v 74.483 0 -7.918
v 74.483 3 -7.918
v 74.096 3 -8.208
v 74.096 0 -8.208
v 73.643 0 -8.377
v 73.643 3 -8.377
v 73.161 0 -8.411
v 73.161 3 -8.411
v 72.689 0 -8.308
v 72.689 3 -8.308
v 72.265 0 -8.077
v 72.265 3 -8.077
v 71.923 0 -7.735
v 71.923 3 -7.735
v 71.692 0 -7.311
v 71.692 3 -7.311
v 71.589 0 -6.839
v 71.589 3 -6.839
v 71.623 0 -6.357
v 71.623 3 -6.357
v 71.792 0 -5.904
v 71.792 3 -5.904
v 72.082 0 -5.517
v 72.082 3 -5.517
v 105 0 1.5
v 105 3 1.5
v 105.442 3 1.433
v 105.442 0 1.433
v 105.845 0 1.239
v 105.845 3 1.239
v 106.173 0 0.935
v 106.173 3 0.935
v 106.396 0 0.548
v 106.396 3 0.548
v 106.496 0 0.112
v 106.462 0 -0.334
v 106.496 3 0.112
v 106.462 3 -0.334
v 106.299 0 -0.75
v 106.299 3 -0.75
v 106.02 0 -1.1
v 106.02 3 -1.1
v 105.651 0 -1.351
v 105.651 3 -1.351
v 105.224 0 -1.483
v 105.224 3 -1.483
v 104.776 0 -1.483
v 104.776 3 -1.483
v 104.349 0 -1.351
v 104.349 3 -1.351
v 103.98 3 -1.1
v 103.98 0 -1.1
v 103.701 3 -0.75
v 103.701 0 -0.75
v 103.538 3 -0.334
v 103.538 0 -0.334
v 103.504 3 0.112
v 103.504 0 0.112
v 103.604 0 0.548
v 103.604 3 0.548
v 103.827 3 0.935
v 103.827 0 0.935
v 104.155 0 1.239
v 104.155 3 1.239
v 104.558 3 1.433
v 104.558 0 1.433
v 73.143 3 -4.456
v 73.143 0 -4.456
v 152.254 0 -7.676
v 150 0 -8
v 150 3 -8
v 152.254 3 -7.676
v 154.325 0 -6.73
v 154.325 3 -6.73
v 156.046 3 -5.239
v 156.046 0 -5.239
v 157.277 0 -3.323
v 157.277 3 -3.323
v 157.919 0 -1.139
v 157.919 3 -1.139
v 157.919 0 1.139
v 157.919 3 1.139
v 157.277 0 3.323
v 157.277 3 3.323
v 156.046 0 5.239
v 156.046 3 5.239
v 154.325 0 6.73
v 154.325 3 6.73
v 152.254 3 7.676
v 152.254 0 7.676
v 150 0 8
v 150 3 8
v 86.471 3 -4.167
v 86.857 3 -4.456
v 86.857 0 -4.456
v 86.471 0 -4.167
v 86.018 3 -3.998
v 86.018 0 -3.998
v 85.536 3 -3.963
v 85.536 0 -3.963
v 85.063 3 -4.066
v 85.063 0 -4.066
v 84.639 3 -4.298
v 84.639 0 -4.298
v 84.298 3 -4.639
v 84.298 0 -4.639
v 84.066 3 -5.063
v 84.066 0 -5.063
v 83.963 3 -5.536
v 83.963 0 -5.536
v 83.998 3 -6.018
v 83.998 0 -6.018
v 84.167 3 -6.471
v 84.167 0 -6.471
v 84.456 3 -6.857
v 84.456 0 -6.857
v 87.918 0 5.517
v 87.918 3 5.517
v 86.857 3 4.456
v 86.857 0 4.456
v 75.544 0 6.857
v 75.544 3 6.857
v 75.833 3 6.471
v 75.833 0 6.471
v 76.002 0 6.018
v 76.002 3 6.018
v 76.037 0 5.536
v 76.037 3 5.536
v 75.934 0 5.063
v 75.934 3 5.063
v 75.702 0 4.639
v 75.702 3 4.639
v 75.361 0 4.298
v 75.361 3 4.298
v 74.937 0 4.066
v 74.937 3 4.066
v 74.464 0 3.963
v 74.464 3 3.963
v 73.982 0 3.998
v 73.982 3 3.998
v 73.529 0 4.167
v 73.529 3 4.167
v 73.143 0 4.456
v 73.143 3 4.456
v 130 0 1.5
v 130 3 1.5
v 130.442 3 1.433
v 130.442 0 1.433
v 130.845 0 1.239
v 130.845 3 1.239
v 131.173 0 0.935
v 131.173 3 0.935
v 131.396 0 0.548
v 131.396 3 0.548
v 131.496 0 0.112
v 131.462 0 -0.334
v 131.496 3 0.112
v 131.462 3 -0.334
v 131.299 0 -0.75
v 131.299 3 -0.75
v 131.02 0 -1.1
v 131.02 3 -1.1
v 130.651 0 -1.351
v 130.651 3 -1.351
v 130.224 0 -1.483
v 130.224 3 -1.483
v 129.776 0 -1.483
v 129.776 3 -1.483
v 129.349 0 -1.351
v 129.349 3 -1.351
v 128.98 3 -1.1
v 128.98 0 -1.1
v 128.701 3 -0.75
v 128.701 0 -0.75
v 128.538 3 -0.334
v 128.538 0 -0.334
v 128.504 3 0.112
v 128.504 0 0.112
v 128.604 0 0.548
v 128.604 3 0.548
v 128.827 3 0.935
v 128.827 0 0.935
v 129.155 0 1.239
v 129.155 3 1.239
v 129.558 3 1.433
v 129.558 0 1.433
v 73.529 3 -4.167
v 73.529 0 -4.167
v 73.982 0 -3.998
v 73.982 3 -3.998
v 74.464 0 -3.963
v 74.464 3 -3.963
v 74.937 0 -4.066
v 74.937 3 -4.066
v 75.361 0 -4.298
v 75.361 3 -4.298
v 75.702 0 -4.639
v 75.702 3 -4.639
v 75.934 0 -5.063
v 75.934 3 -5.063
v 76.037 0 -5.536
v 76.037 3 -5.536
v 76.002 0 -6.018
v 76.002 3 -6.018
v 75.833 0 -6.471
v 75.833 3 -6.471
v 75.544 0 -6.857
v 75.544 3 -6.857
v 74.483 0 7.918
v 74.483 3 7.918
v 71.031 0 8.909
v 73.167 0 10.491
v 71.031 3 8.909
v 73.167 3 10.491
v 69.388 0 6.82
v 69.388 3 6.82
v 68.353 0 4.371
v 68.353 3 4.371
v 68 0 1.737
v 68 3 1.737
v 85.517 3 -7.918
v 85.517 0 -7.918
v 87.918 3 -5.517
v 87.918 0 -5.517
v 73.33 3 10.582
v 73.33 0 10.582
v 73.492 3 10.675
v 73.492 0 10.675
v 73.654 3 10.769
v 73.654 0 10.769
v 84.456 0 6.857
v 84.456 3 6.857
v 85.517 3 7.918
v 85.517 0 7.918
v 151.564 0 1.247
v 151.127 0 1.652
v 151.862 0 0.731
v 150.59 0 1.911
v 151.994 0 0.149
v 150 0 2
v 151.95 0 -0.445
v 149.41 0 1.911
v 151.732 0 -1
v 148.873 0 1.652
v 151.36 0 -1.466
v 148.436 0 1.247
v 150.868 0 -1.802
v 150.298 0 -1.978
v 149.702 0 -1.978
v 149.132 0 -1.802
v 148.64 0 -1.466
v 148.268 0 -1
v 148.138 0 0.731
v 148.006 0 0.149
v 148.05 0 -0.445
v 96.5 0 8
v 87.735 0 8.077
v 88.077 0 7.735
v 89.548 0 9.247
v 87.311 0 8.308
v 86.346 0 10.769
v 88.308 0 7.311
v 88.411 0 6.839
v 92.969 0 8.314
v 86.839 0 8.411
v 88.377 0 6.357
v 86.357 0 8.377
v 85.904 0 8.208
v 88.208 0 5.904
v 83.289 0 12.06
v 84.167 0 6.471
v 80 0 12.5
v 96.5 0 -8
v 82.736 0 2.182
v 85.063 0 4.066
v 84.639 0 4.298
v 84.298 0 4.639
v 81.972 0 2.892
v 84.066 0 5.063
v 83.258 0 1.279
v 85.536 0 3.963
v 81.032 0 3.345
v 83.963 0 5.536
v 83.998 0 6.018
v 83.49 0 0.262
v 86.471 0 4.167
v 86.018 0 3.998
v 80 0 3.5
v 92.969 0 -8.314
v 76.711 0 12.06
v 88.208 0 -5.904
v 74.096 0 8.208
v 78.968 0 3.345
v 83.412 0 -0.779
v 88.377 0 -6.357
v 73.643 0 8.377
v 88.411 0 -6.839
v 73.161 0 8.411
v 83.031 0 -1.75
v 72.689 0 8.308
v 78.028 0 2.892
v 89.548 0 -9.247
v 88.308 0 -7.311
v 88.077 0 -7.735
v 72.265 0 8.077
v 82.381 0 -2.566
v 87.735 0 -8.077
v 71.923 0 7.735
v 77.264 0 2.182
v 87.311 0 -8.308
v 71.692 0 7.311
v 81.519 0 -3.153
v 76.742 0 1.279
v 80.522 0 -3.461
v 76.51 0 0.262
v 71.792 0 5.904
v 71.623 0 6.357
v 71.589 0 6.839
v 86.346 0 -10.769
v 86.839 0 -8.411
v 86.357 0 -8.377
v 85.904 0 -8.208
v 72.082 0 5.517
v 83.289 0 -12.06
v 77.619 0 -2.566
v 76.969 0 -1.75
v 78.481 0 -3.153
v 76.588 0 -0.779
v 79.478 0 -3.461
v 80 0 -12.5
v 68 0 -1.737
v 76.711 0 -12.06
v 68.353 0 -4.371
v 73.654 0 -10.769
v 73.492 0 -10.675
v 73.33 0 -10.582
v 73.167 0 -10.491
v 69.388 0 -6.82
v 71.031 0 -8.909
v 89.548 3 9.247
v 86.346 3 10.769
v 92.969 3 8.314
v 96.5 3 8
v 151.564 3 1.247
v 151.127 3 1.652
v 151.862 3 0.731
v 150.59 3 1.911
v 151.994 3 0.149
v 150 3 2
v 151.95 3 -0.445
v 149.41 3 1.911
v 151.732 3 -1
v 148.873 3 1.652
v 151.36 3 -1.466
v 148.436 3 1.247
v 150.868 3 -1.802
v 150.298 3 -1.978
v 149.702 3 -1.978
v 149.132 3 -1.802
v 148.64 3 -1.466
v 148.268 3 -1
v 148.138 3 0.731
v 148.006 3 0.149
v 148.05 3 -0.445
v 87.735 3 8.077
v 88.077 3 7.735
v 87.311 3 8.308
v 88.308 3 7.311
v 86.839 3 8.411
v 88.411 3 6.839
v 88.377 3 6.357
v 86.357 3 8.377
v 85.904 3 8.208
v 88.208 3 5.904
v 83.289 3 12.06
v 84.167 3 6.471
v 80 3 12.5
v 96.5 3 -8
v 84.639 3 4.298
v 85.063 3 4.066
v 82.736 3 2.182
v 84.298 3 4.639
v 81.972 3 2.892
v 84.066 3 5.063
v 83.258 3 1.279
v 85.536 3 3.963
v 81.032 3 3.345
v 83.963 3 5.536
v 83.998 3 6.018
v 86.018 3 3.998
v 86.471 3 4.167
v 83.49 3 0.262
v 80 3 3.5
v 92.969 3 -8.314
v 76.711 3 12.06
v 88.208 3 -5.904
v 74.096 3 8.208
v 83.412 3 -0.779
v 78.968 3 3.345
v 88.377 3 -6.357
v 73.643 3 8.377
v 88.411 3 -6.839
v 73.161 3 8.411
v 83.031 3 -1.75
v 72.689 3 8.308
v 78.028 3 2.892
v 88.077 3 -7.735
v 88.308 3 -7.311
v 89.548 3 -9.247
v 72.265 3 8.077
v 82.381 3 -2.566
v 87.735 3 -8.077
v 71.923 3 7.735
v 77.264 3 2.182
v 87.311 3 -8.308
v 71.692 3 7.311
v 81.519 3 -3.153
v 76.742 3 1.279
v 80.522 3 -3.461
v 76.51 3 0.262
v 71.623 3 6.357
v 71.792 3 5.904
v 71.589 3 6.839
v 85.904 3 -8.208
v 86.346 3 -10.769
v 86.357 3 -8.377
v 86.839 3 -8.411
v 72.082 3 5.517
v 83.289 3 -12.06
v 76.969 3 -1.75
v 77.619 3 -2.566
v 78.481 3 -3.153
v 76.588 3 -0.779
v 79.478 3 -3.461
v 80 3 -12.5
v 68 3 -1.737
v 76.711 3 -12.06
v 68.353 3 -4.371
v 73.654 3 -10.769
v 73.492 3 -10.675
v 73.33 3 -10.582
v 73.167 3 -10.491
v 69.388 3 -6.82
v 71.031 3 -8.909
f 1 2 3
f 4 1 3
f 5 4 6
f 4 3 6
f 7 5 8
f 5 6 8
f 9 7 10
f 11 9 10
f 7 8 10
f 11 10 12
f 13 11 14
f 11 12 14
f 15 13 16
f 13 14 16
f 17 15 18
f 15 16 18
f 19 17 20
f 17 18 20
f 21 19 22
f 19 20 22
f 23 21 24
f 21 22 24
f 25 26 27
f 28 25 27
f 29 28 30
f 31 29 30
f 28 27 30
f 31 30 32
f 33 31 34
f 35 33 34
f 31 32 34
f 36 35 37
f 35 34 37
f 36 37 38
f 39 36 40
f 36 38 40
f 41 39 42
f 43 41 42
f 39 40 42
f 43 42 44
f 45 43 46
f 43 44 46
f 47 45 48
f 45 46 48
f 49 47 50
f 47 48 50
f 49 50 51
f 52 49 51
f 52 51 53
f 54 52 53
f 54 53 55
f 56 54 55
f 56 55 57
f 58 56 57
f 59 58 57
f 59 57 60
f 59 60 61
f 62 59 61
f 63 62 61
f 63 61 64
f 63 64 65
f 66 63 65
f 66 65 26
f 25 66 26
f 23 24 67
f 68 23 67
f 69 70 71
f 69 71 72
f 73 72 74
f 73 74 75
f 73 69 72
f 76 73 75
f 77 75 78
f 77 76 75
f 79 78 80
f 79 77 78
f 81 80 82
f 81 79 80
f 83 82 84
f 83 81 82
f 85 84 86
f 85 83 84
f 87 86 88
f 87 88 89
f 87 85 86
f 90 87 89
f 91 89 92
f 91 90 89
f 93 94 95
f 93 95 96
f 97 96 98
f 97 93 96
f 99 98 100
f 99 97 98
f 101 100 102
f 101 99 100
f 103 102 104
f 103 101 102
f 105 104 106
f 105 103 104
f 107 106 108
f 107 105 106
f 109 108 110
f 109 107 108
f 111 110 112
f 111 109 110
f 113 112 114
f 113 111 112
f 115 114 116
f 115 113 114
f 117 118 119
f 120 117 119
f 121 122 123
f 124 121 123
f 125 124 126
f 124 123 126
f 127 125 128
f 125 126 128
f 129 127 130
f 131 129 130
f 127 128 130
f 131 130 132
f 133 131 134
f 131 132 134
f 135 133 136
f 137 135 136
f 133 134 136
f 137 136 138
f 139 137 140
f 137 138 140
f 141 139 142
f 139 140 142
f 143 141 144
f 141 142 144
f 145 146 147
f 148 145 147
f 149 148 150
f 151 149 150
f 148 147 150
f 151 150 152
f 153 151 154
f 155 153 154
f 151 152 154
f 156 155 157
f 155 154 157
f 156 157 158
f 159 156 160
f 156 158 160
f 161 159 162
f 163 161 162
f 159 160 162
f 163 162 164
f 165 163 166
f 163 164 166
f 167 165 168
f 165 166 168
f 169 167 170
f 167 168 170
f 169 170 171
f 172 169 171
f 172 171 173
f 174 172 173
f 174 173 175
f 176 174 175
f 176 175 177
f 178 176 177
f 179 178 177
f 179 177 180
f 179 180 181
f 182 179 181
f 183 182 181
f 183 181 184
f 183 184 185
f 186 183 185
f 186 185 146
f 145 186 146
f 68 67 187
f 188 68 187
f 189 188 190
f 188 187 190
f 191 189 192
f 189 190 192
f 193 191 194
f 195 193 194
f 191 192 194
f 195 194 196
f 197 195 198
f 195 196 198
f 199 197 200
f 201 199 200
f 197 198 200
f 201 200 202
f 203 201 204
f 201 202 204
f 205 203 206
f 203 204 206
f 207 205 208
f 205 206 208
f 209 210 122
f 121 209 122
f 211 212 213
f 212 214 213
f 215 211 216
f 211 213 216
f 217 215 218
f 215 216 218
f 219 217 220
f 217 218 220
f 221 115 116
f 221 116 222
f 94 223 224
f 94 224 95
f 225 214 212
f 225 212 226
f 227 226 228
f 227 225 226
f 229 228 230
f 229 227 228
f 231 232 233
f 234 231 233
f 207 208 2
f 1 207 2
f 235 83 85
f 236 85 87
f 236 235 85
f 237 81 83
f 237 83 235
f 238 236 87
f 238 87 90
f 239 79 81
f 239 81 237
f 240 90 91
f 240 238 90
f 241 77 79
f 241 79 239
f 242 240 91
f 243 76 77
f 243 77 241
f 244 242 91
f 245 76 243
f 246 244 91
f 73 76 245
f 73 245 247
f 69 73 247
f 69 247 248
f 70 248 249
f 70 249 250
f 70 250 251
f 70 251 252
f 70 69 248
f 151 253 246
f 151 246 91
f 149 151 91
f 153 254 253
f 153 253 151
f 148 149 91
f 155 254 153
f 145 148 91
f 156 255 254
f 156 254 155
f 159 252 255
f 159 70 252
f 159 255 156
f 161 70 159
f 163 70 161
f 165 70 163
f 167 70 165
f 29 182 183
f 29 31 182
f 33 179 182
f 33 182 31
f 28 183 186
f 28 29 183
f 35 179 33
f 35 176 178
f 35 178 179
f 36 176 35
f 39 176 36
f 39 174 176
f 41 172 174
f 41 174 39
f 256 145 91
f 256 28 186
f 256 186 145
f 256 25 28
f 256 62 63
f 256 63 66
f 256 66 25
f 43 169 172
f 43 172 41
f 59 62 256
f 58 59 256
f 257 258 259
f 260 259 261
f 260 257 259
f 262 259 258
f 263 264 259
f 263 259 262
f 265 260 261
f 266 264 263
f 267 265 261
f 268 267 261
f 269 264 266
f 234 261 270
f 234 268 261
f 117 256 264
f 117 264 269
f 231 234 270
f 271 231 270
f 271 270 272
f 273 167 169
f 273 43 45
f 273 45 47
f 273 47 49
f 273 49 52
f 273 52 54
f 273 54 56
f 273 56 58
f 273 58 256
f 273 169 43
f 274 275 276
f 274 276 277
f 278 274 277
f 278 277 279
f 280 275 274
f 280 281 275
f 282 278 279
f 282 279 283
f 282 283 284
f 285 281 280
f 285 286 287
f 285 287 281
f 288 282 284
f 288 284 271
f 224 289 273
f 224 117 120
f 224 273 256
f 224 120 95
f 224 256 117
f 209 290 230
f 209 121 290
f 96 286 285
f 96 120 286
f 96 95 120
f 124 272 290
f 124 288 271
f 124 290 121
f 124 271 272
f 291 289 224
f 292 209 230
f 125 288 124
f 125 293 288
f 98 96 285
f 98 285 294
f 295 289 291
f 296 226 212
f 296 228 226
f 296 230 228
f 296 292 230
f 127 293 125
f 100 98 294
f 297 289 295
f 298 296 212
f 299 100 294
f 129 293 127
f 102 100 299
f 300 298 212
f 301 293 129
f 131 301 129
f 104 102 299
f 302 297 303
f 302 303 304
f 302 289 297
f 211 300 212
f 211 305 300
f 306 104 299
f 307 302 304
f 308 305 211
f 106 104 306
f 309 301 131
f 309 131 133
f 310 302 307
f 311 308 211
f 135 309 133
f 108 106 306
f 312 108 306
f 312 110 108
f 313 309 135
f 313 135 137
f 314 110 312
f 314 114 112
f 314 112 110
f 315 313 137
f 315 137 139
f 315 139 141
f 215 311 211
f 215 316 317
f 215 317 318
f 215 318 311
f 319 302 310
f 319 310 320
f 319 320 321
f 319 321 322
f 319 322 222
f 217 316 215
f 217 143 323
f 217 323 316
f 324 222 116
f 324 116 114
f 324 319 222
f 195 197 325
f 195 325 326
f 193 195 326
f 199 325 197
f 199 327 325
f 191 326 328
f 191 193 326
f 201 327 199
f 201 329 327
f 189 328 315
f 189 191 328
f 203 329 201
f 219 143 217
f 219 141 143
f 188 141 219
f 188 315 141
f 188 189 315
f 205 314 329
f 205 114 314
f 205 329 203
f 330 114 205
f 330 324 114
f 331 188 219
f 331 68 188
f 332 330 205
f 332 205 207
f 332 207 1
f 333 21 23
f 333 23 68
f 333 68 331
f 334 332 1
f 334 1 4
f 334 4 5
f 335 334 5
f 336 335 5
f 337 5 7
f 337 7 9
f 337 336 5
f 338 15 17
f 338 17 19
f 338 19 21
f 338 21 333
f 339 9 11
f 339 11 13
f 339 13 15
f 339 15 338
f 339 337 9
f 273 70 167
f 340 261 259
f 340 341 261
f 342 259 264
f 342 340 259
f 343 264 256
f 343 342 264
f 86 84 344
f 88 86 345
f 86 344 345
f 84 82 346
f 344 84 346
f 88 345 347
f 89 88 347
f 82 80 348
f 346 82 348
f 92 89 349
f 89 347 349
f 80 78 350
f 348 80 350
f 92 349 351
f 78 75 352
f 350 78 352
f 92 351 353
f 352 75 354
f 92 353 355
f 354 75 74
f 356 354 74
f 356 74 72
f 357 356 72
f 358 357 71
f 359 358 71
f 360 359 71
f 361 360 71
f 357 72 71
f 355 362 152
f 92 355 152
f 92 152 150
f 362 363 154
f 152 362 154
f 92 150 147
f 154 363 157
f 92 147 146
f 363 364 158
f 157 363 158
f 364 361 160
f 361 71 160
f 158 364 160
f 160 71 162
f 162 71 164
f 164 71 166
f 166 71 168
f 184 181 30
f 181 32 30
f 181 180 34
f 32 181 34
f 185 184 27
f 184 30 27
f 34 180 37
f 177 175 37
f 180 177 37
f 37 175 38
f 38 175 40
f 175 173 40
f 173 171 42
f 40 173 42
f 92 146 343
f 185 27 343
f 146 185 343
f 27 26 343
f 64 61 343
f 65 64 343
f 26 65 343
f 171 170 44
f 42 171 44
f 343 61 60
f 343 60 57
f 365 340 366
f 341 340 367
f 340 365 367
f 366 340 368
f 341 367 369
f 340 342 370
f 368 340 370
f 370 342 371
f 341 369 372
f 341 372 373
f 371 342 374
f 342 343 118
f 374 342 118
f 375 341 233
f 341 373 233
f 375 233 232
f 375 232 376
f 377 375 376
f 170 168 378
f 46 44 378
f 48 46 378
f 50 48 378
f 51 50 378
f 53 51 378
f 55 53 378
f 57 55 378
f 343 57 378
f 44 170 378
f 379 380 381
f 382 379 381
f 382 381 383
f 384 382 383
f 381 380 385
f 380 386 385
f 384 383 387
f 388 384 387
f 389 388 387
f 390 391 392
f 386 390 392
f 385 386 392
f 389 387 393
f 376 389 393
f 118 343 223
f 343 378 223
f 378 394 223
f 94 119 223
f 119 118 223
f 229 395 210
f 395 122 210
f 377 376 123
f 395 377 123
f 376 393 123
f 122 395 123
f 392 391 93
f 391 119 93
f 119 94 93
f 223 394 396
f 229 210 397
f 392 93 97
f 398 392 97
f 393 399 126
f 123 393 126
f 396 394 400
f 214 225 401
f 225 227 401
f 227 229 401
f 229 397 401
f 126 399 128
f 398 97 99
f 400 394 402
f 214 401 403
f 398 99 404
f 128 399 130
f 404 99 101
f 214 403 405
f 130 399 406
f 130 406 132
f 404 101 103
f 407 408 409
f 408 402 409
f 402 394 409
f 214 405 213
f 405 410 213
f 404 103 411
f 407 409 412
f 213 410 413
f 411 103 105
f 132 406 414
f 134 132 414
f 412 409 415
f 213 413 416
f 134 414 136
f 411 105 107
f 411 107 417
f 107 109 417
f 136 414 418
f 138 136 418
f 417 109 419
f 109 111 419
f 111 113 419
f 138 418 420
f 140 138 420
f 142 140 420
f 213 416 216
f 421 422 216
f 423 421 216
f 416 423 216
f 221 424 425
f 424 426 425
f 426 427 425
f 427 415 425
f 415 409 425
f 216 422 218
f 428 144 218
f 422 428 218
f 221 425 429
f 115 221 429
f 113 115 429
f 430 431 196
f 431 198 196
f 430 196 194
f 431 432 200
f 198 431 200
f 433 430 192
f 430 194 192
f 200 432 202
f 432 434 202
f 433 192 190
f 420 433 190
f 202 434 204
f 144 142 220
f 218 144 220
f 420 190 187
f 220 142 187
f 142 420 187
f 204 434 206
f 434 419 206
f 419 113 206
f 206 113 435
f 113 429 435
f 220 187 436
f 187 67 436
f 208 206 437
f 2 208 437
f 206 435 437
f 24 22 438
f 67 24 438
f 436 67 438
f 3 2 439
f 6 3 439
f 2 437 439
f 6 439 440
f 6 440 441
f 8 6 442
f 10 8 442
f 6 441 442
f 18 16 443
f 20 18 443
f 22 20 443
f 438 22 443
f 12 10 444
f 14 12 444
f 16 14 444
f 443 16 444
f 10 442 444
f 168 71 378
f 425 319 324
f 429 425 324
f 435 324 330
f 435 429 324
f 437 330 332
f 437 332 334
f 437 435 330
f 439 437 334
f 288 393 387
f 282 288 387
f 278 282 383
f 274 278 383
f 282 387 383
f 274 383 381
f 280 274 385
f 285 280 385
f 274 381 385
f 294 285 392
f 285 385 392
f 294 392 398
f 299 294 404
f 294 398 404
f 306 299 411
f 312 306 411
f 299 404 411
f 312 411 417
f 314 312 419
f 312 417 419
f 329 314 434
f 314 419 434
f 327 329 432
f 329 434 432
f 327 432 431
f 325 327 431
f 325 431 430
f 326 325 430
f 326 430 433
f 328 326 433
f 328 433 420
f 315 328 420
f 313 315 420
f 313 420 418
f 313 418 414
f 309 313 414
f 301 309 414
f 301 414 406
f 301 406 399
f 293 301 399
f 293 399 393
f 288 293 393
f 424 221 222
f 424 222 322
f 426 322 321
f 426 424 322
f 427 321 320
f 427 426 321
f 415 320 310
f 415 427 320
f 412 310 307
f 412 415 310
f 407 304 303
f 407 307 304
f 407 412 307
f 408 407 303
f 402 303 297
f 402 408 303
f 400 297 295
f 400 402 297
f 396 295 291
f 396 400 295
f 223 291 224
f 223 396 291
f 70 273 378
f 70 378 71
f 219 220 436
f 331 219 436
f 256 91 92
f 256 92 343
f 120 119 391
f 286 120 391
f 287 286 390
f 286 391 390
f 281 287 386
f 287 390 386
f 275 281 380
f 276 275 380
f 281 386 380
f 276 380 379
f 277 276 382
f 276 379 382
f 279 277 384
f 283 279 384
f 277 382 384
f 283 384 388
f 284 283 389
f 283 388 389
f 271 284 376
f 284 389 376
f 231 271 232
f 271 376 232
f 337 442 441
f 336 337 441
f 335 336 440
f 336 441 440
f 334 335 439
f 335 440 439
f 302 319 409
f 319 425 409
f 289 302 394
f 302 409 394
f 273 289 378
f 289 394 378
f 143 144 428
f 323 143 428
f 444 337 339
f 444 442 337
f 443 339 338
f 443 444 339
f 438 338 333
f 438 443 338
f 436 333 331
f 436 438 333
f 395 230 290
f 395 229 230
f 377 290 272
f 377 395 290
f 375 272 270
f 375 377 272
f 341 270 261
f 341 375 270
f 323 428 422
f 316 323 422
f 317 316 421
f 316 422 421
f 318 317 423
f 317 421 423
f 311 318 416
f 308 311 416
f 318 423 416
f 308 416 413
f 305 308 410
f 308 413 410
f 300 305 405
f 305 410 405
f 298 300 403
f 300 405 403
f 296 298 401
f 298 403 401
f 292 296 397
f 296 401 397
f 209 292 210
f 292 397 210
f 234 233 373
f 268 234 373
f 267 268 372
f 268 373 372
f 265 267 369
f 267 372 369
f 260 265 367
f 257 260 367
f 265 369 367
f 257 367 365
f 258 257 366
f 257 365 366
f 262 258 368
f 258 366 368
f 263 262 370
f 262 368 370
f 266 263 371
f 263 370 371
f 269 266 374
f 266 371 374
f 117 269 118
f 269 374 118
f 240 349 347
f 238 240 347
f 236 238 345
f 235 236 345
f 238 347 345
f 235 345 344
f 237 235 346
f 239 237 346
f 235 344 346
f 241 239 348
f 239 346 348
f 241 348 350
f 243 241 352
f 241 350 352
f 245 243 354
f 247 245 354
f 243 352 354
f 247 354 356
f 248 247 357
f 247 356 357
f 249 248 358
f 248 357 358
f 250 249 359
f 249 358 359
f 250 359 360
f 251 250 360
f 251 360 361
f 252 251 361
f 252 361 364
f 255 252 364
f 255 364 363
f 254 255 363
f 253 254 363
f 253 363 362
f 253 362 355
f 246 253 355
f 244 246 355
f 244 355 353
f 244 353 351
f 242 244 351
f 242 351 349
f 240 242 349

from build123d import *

# Parameters (mm, degrees)
EXTRUDE_1_DEPTH     = 3
SKETCH_8_R          = 12.5
EXTRUDE_2_DEPTH     = 3
SKETCH_2_R          = 3.5
CUT_EXTRUDE_1_DEPTH = 159.522080481
SKETCH_5_R          = 1.5
CUT_EXTRUDE_2_DEPTH = 159.522080481
FILLET_3_R          = 20
SKETCH_9_R          = 2
CUT_EXTRUDE_3_DEPTH = 159.522080481
SKETCH_12_W         = 86.588173056
SKETCH_12_H         = 26.208680734
CUT_EXTRUDE_4_DEPTH = 159.522080481
FILLET_4_R          = 10
SKETCH_13_R         = 1.5
CUT_EXTRUDE_5_DEPTH = 159.522080481


with BuildPart() as part:
    # 草图1 → 凸台-拉伸1 (new body)
    with BuildSketch(Plane(origin=(0, 0, 0), x_dir=(1, 0, 0), z_dir=(0, 1, 0))):
        with BuildLine():
            Line((0, 8), (150, 8))
            ThreePointArc((150, 8), (158, 0), (150, -8))
            Line((150, -8), (0, -8))
            ThreePointArc((0, -8), (-8, 0), (0, 8))
        make_face()
    extrude(amount=EXTRUDE_1_DEPTH)

    # 草图8 → 凸台-拉伸2 (add)
    with BuildSketch(Plane(origin=(0, 3, 0), x_dir=(1, 0, 0), z_dir=(0, 1, 0))):
        with Locations((80, 0)):
            Circle(SKETCH_8_R)
    extrude(amount=-EXTRUDE_2_DEPTH)

    # 草图2 → 切除-拉伸1 (cut, through all)
    with BuildSketch(Plane(origin=(0, 3, 0), x_dir=(1, 0, 0), z_dir=(0, 1, 0))):
        with Locations(Location((80, 0, 0), (0, 0, 270))):
            Circle(SKETCH_2_R)
        with BuildLine():
            Line((84.456249475, 6.857459024), (85.516909647, 7.918119195))
            ThreePointArc((85.516909647, 7.918119195), (87.918119195, 7.918119195), (87.918119195, 5.516909647))
            Line((87.918119195, 5.516909647), (86.857459024, 4.456249475))
            ThreePointArc((86.857459024, 4.456249475), (84.456249475, 4.456249475), (84.456249475, 6.857459024))
        make_face()
        with BuildLine():
            Line((84.456249475, -6.857459024), (85.516909647, -7.918119195))
            ThreePointArc((85.516909647, -7.918119195), (87.918119195, -7.918119195), (87.918119195, -5.516909647))
            Line((87.918119195, -5.516909647), (86.857459024, -4.456249475))
            ThreePointArc((86.857459024, -4.456249475), (84.456249475, -4.456249475), (84.456249475, -6.857459024))
        make_face()
        with BuildLine():
            Line((73.142540976, -4.456249475), (72.081880805, -5.516909647))
            ThreePointArc((72.081880805, -5.516909647), (72.081880805, -7.918119195), (74.483090353, -7.918119195))
            Line((74.483090353, -7.918119195), (75.543750525, -6.857459024))
            ThreePointArc((75.543750525, -6.857459024), (75.543750525, -4.456249475), (73.142540976, -4.456249475))
        make_face()
        with BuildLine():
            Line((75.543750525, 6.857459024), (74.483090353, 7.918119195))
            ThreePointArc((74.483090353, 7.918119195), (72.081880805, 7.918119195), (72.081880805, 5.516909647))
            Line((72.081880805, 5.516909647), (73.142540976, 4.456249475))
            ThreePointArc((73.142540976, 4.456249475), (75.543750525, 4.456249475), (75.543750525, 6.857459024))
        make_face()
    extrude(amount=-CUT_EXTRUDE_1_DEPTH, mode=Mode.SUBTRACT)

    # 草图5 → 切除-拉伸2 (cut, through all)
    with BuildSketch(Plane(origin=(0, 3, 0), x_dir=(1, 0, 0), z_dir=(0, 1, 0))):
        with Locations(Location((10, 0, 0), (0, 0, 270))):
            Circle(SKETCH_5_R)
        with Locations(Location((0, 5, 0), (0, 0, 270))):
            Circle(SKETCH_5_R)
        with Locations(Location((0, -5, 0), (0, 0, 270))):
            Circle(SKETCH_5_R)
    extrude(amount=-CUT_EXTRUDE_2_DEPTH, mode=Mode.SUBTRACT)

    # 圆角3
    fillet_3_edges = [part.edges().sort_by_distance(p)[0] for p in [
        (70.395313644, 1.5, 8),
        (70.395313644, 1.5, -8),
        (89.604686356, 1.5, 8),
        (89.604686356, 1.5, -8),
    ]]
    fillet(fillet_3_edges, radius=FILLET_3_R)

    # 草图9 → 切除-拉伸3 (cut, through all)
    with BuildSketch(Plane(origin=(0, 3, 0), x_dir=(1, 0, 0), z_dir=(0, 1, 0))):
        with Locations(Location((150, 0, 0), (0, 0, 270))):
            Circle(SKETCH_9_R)
    extrude(amount=-CUT_EXTRUDE_3_DEPTH, mode=Mode.SUBTRACT)

    # 草图12 → 切除-拉伸4 (cut, through all)
    with BuildSketch(Plane(origin=(0, 3, 0), x_dir=(1, 0, 0), z_dir=(0, 1, 0))):
        with Locations((24.705913472, 0)):
            Rectangle(SKETCH_12_W, SKETCH_12_H)
    extrude(amount=-CUT_EXTRUDE_4_DEPTH, mode=Mode.SUBTRACT)

    # 圆角4
    fillet_4_edges = [part.edges().sort_by_distance(p)[0] for p in [
        (68, 1.5, -8.51282473),
        (68, 1.5, 8.51282473),
    ]]
    fillet(fillet_4_edges, radius=FILLET_4_R)

    # 草图13 → 切除-拉伸5 (cut, through all)
    with BuildSketch(Plane(origin=(0, 3, 0), x_dir=(1, 0, 0), z_dir=(0, 1, 0))):
        with Locations(Location((105, 0, 0), (0, 0, 270))):
            Circle(SKETCH_13_R)
        with Locations(Location((130, 0, 0), (0, 0, 270))):
            Circle(SKETCH_13_R)
    extrude(amount=-CUT_EXTRUDE_5_DEPTH, mode=Mode.SUBTRACT)


solid = part.part
